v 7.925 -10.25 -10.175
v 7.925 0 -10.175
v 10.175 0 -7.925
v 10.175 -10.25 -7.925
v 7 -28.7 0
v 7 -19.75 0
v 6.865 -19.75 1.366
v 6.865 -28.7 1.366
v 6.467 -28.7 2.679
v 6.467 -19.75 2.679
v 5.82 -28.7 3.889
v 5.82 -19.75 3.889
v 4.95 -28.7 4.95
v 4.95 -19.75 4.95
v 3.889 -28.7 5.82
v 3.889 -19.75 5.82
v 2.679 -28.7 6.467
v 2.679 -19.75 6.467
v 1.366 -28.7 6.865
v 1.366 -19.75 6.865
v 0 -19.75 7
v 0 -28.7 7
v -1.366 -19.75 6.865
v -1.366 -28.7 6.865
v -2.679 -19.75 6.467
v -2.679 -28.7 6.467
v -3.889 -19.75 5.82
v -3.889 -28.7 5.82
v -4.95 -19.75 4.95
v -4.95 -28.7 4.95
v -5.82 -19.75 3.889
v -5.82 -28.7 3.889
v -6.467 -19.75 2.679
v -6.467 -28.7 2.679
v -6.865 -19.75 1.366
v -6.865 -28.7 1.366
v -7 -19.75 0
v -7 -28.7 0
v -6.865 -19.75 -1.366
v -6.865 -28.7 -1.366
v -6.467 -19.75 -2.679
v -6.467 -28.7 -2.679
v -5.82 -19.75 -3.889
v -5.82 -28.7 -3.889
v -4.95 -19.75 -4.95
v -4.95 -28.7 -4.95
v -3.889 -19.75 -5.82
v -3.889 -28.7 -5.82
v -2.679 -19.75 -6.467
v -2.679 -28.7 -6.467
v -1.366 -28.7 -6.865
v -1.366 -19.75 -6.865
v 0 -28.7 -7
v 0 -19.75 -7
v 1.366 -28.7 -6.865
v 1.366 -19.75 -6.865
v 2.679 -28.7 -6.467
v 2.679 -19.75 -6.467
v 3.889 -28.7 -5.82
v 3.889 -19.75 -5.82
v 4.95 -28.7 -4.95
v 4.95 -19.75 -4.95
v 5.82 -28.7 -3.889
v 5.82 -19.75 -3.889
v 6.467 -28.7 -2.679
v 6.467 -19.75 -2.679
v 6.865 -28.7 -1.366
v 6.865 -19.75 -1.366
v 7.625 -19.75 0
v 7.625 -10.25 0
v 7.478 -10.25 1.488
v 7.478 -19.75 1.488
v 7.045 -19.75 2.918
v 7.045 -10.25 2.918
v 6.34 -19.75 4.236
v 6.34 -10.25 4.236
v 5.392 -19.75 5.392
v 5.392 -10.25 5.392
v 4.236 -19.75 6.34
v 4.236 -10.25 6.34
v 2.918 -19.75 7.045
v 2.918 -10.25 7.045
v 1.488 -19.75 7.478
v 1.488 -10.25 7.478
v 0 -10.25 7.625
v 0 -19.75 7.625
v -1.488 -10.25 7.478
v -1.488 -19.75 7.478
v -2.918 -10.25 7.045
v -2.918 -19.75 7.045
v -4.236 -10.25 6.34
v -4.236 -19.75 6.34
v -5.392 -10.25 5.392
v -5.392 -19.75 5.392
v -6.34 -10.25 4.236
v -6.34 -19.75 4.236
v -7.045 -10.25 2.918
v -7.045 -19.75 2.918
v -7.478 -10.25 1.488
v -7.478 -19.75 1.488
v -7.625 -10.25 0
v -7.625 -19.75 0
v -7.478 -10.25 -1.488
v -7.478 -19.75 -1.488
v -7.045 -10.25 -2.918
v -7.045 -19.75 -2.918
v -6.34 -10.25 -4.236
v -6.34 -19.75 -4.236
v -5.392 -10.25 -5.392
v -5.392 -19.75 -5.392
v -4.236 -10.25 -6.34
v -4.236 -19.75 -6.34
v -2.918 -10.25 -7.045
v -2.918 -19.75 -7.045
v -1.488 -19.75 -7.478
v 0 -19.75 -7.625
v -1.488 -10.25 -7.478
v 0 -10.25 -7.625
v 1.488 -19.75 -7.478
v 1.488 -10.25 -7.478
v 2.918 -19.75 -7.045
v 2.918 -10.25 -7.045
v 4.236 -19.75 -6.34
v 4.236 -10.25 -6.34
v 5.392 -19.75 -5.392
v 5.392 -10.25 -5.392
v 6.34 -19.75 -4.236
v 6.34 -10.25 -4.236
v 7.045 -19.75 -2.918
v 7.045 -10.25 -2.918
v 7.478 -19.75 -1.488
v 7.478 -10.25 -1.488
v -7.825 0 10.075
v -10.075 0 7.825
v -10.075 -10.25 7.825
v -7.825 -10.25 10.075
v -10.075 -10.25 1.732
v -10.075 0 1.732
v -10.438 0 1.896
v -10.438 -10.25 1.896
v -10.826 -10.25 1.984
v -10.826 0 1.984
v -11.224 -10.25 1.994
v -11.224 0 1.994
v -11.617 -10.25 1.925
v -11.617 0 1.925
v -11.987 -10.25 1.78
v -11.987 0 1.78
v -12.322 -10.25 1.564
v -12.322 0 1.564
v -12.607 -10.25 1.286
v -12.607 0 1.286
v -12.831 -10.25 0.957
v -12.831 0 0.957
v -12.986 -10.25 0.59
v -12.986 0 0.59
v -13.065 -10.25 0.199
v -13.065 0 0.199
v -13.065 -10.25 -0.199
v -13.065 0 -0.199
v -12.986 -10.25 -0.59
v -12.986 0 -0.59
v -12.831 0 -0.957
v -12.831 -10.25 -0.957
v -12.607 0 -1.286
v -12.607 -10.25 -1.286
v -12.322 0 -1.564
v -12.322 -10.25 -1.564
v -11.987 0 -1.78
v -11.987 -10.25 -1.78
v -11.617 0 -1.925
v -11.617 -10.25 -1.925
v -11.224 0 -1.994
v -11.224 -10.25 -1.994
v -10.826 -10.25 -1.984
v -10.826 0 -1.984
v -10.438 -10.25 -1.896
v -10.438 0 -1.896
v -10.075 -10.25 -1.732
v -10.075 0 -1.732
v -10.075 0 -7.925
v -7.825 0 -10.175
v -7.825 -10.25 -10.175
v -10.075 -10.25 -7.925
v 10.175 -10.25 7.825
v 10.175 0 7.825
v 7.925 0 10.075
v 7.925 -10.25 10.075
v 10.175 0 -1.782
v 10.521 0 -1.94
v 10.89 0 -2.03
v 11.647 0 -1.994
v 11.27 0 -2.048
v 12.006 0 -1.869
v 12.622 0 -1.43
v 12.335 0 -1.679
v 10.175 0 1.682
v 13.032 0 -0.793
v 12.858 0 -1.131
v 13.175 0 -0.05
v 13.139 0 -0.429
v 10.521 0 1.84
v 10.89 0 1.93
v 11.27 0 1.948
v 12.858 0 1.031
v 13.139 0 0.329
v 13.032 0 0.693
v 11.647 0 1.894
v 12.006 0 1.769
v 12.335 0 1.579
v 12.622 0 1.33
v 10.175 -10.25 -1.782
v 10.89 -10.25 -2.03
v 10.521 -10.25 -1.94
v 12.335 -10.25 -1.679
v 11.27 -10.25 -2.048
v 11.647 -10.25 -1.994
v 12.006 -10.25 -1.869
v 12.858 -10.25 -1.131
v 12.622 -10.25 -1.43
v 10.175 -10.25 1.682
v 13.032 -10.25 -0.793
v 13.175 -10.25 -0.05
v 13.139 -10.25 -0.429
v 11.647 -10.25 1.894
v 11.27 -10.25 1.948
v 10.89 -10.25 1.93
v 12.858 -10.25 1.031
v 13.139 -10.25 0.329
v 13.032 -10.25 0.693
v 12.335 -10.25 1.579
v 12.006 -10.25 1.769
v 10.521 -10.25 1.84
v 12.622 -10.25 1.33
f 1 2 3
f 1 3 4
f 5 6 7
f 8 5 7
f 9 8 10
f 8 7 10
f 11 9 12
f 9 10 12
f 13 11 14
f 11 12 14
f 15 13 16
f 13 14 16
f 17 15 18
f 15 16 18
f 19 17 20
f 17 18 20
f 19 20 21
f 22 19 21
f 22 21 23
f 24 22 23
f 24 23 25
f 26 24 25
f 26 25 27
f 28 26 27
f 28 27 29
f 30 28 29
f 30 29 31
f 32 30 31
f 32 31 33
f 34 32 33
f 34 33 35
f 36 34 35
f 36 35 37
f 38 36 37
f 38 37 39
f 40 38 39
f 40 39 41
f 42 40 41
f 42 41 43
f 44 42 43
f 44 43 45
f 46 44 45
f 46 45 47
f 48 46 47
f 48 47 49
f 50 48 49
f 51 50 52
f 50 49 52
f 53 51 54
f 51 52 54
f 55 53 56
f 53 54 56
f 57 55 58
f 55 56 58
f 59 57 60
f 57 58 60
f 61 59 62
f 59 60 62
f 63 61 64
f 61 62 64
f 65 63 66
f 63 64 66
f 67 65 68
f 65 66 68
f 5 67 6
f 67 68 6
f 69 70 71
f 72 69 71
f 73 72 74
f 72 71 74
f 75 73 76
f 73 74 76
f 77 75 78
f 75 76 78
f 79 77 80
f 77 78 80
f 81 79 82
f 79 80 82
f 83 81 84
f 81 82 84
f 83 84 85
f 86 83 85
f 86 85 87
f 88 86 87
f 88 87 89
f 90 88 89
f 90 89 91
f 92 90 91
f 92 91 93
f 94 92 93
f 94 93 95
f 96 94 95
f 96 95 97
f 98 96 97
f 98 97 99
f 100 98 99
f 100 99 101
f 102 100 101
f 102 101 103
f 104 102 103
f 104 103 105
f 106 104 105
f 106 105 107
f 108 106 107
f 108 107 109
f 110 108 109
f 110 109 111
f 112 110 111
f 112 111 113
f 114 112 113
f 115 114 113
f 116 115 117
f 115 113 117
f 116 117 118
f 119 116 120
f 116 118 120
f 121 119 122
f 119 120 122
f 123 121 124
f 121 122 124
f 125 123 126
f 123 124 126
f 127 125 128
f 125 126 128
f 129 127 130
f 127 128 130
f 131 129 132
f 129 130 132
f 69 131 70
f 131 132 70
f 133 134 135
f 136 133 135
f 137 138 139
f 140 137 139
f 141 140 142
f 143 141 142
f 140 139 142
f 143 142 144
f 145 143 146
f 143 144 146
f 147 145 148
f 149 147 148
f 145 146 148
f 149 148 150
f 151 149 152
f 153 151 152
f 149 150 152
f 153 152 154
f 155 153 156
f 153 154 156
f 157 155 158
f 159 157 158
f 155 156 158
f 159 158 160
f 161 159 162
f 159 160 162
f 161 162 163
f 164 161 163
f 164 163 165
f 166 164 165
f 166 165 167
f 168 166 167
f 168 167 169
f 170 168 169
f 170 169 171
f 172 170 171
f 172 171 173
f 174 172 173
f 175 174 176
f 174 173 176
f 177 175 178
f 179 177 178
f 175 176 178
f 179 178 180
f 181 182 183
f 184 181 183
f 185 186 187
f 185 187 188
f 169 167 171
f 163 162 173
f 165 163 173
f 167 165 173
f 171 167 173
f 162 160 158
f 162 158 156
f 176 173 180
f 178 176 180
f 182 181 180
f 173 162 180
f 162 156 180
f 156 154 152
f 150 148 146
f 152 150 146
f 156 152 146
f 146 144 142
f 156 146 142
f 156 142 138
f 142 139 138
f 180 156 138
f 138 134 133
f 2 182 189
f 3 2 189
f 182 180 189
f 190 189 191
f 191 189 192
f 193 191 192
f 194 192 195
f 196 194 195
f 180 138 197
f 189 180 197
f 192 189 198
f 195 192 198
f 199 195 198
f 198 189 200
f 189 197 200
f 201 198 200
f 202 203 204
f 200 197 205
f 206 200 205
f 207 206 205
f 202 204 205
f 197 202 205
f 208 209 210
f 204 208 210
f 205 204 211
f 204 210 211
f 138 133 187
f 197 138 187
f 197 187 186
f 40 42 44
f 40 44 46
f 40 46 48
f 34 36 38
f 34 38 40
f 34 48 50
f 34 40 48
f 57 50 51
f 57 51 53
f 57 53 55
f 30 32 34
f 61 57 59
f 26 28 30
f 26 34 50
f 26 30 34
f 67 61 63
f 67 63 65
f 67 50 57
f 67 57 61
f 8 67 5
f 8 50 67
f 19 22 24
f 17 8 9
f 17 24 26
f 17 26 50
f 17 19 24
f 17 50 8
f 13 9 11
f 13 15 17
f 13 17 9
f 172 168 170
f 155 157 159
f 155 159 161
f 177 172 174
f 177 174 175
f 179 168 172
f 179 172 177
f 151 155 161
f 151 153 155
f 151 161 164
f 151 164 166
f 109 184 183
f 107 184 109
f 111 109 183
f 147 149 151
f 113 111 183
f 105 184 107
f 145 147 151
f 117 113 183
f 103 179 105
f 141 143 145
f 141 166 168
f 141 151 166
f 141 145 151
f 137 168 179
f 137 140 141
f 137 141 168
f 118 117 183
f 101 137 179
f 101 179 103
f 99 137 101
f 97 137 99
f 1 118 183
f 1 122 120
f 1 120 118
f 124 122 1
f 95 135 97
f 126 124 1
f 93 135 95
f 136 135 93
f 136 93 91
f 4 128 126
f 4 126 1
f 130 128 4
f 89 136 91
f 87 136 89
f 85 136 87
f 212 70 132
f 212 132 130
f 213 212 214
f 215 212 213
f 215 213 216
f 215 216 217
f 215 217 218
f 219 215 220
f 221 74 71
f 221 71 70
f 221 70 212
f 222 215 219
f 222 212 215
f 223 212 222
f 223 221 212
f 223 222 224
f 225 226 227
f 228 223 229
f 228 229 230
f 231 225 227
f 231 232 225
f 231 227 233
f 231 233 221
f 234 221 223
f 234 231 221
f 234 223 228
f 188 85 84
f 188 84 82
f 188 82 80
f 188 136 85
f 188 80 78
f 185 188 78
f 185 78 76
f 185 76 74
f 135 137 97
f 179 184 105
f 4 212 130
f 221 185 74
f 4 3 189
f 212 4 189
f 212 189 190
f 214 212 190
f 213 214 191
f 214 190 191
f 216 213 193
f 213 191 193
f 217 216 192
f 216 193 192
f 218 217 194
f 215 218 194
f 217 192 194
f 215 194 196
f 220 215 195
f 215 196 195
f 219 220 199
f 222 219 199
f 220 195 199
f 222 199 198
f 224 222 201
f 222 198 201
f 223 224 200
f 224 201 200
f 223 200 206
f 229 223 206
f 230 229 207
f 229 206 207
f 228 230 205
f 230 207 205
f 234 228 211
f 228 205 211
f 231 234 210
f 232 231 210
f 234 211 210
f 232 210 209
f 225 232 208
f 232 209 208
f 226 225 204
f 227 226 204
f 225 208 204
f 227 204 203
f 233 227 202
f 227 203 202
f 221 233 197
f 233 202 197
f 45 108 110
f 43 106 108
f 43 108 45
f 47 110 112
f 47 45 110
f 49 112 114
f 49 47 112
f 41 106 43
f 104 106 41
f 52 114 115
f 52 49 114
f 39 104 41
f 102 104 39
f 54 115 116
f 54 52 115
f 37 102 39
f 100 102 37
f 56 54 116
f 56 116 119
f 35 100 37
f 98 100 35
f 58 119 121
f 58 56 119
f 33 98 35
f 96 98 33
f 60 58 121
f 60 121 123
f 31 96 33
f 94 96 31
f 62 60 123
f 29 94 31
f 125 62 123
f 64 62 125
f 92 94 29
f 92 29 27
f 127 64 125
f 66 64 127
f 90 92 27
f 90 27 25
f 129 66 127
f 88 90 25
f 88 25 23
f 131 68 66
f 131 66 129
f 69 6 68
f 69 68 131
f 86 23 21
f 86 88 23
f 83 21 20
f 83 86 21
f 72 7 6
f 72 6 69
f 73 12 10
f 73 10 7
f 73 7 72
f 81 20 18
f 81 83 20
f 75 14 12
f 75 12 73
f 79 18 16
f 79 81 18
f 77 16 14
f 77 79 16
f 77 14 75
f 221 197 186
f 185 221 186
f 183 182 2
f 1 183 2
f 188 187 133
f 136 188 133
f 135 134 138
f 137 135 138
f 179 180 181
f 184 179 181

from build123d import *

# Parameters (mm, degrees)
F0_R     = 7.625
F0_R_2   = 7
F1_DEPTH = 10.25
F2_DEPTH = 19.75
F3_DEPTH = 28.7
F4_SIZE  = 2.25


with BuildPart() as f1:
    # F0 (on Front) → F1 (new body)
    with BuildSketch(Plane.XZ):
        with BuildLine():
            Line((10.175, 10.075), (-10.075, 10.075))
            Line((-10.075, 10.075), (-10.075, 1.7320508076))
            ThreePointArc((-10.075, 1.7320508076), (-9.3429491924, 1), (-9.075, 0))
            ThreePointArc((-9.075, 0), (-9.3429491924, -1), (-10.075, -1.7320508076))
            Line((-10.075, -1.7320508076), (-10.075, -10.175))
            Line((-10.075, -10.175), (10.175, -10.175))
            Line((10.175, -10.175), (10.175, -1.7820508076))
            ThreePointArc((10.175, -1.7820508076), (9.175, -0.05), (10.175, 1.6820508076))
            Line((10.175, 1.6820508076), (10.175, 10.075))
        make_face()
        Circle(F0_R, mode=Mode.SUBTRACT)
        with BuildLine():
            Line((-10.075, -1.7320508076), (-10.075, 1.7320508076))
            ThreePointArc((-10.075, 1.7320508076), (-13.075, 0), (-10.075, -1.7320508076))
        make_face()
        with BuildLine():
            ThreePointArc((13.175, -0.05), (12.175, 1.6820508076), (10.175, 1.6820508076))
            Line((10.175, 1.6820508076), (10.175, -1.7820508076))
            ThreePointArc((10.175, -1.7820508076), (12.175, -1.7820508076), (13.175, -0.05))
        make_face()
        with BuildLine():
            Line((10.175, -1.7820508076), (10.175, 1.6820508076))
            ThreePointArc((10.175, 1.6820508076), (9.175, -0.05), (10.175, -1.7820508076))
        make_face()
        Circle(F0_R)
        Circle(F0_R_2, mode=Mode.SUBTRACT)
        Circle(F0_R_2)
        with BuildLine():
            ThreePointArc((-9.075, 0), (-9.3429491924, 1), (-10.075, 1.7320508076))
            Line((-10.075, 1.7320508076), (-10.075, -1.7320508076))
            ThreePointArc((-10.075, -1.7320508076), (-9.3429491924, -1), (-9.075, 0))
        make_face()
    extrude(amount=F1_DEPTH)

    # F0 (on Front) → F2 (join)
    with BuildSketch(Plane.XZ):
        Circle(F0_R)
        Circle(F0_R_2, mode=Mode.SUBTRACT)
        Circle(F0_R_2)
    extrude(amount=F2_DEPTH)

    # F0 (on Front) → F3 (join)
    with BuildSketch(Plane.XZ):
        Circle(F0_R_2)
    extrude(amount=F3_DEPTH)

    # F4
    f4_edges = [f1.edges().sort_by_distance(p)[0] for p in [
        (-10.075, -5.125, 10.075),
        (10.175, -5.125, 10.075),
        (10.175, -5.125, -10.175),
        (-10.075, -5.125, -10.175),
    ]]
    chamfer(f4_edges, length=F4_SIZE)


solid = f1.part
